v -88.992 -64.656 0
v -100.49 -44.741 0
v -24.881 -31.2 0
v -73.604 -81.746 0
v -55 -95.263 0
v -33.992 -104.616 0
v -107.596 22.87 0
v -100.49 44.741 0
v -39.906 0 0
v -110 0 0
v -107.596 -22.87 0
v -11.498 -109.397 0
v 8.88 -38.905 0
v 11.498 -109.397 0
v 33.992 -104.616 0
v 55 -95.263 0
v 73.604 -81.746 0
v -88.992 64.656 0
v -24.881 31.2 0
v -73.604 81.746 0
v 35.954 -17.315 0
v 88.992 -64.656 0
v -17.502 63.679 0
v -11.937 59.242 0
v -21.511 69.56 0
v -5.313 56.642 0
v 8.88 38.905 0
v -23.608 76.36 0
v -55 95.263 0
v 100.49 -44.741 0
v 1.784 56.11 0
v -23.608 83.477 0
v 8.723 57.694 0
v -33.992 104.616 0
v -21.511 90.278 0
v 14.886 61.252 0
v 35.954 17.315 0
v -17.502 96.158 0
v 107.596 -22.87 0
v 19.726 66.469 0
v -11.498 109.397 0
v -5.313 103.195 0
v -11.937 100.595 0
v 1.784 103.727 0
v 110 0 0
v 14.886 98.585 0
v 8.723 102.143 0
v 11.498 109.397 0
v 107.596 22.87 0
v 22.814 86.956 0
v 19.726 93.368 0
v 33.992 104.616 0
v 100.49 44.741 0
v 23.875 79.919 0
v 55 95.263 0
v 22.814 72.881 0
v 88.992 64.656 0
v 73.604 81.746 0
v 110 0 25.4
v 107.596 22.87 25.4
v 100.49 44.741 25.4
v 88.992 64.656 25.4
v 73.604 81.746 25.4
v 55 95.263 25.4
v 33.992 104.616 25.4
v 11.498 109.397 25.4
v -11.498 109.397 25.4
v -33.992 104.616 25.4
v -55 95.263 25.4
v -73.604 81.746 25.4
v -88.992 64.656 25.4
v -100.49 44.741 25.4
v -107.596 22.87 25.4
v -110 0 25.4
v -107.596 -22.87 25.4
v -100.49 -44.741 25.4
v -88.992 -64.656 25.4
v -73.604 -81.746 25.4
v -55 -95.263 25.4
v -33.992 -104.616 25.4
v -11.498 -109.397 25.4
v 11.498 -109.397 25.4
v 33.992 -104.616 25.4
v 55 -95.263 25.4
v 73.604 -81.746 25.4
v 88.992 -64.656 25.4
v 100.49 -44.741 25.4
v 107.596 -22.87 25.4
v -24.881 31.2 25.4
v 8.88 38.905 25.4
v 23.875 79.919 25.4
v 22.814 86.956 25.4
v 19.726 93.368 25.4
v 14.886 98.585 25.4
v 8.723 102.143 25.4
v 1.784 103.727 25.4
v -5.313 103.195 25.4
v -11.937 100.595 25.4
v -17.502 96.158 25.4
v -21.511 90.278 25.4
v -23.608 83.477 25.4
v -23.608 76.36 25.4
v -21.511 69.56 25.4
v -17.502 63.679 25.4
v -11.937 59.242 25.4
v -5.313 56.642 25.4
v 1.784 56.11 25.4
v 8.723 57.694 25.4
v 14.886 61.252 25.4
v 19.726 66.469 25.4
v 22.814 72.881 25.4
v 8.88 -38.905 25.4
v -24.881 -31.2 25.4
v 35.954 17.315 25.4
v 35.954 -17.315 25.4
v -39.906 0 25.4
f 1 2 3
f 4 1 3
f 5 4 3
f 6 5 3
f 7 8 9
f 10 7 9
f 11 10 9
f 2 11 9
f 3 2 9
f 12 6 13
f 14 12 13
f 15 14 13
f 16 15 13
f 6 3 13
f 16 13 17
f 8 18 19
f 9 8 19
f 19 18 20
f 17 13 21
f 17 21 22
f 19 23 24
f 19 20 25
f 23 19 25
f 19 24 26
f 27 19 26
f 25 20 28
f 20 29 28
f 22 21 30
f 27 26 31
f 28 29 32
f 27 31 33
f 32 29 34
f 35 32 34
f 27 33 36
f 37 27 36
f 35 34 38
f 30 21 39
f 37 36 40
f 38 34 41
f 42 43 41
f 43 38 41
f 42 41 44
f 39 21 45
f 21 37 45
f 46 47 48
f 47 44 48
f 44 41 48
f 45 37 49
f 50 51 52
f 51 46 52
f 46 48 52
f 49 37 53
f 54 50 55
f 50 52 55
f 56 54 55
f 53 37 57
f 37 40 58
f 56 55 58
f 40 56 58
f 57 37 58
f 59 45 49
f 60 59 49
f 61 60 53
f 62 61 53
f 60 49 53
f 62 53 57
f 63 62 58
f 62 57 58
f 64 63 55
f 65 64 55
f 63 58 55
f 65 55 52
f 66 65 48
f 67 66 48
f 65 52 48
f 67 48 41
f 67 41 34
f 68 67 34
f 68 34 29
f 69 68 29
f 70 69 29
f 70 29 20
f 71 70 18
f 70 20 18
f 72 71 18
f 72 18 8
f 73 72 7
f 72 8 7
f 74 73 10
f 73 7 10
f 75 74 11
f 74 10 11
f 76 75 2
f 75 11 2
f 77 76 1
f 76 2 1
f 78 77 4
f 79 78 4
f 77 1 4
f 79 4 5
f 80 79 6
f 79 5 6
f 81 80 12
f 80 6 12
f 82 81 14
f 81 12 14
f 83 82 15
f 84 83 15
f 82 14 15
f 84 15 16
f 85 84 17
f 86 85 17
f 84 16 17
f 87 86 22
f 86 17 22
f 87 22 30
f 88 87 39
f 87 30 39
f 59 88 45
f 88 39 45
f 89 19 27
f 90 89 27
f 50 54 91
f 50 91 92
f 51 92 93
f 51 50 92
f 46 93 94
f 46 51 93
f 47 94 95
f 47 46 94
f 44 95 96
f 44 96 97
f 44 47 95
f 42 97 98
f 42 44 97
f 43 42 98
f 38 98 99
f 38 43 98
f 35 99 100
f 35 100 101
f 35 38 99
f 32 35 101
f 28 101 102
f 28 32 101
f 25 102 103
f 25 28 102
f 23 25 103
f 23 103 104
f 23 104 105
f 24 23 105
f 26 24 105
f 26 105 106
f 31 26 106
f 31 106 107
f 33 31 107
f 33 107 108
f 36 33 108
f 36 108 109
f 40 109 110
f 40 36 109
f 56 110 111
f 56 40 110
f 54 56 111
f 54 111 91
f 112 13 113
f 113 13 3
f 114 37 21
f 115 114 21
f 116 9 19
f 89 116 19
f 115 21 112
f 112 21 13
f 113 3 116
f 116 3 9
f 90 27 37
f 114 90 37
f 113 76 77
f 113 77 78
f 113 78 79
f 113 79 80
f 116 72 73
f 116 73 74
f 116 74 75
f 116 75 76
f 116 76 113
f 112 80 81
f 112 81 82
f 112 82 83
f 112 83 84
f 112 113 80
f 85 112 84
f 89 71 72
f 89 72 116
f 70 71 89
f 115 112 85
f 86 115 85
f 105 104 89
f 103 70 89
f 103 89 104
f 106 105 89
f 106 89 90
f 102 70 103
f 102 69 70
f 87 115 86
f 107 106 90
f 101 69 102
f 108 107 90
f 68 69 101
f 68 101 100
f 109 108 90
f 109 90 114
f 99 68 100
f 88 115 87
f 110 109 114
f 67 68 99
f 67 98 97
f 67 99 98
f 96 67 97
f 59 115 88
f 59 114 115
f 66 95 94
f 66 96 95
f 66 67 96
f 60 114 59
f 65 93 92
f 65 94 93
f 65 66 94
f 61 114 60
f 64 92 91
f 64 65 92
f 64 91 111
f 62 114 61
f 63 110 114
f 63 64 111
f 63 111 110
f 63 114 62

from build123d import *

# Parameters (mm, degrees)
F0_R     = 110
F0_R_2   = 23.874977
F1_DEPTH = 25.4


with BuildPart() as f1:
    # F0 (on Top) → F1 (new body)
    with BuildSketch(Plane.XY):
        Circle(F0_R)
        Polygon((8.879913, 38.905439), (35.954032, 17.314549), (35.954032, -17.314549), (8.879913, -38.905439), (-24.880962, -31.19974), (-39.905965, 0), (-24.880962, 31.19974), align=None, mode=Mode.SUBTRACT)
        with Locations((0, 79.918548)):
            Circle(F0_R_2, mode=Mode.SUBTRACT)
    extrude(amount=F1_DEPTH)


solid = f1.part
